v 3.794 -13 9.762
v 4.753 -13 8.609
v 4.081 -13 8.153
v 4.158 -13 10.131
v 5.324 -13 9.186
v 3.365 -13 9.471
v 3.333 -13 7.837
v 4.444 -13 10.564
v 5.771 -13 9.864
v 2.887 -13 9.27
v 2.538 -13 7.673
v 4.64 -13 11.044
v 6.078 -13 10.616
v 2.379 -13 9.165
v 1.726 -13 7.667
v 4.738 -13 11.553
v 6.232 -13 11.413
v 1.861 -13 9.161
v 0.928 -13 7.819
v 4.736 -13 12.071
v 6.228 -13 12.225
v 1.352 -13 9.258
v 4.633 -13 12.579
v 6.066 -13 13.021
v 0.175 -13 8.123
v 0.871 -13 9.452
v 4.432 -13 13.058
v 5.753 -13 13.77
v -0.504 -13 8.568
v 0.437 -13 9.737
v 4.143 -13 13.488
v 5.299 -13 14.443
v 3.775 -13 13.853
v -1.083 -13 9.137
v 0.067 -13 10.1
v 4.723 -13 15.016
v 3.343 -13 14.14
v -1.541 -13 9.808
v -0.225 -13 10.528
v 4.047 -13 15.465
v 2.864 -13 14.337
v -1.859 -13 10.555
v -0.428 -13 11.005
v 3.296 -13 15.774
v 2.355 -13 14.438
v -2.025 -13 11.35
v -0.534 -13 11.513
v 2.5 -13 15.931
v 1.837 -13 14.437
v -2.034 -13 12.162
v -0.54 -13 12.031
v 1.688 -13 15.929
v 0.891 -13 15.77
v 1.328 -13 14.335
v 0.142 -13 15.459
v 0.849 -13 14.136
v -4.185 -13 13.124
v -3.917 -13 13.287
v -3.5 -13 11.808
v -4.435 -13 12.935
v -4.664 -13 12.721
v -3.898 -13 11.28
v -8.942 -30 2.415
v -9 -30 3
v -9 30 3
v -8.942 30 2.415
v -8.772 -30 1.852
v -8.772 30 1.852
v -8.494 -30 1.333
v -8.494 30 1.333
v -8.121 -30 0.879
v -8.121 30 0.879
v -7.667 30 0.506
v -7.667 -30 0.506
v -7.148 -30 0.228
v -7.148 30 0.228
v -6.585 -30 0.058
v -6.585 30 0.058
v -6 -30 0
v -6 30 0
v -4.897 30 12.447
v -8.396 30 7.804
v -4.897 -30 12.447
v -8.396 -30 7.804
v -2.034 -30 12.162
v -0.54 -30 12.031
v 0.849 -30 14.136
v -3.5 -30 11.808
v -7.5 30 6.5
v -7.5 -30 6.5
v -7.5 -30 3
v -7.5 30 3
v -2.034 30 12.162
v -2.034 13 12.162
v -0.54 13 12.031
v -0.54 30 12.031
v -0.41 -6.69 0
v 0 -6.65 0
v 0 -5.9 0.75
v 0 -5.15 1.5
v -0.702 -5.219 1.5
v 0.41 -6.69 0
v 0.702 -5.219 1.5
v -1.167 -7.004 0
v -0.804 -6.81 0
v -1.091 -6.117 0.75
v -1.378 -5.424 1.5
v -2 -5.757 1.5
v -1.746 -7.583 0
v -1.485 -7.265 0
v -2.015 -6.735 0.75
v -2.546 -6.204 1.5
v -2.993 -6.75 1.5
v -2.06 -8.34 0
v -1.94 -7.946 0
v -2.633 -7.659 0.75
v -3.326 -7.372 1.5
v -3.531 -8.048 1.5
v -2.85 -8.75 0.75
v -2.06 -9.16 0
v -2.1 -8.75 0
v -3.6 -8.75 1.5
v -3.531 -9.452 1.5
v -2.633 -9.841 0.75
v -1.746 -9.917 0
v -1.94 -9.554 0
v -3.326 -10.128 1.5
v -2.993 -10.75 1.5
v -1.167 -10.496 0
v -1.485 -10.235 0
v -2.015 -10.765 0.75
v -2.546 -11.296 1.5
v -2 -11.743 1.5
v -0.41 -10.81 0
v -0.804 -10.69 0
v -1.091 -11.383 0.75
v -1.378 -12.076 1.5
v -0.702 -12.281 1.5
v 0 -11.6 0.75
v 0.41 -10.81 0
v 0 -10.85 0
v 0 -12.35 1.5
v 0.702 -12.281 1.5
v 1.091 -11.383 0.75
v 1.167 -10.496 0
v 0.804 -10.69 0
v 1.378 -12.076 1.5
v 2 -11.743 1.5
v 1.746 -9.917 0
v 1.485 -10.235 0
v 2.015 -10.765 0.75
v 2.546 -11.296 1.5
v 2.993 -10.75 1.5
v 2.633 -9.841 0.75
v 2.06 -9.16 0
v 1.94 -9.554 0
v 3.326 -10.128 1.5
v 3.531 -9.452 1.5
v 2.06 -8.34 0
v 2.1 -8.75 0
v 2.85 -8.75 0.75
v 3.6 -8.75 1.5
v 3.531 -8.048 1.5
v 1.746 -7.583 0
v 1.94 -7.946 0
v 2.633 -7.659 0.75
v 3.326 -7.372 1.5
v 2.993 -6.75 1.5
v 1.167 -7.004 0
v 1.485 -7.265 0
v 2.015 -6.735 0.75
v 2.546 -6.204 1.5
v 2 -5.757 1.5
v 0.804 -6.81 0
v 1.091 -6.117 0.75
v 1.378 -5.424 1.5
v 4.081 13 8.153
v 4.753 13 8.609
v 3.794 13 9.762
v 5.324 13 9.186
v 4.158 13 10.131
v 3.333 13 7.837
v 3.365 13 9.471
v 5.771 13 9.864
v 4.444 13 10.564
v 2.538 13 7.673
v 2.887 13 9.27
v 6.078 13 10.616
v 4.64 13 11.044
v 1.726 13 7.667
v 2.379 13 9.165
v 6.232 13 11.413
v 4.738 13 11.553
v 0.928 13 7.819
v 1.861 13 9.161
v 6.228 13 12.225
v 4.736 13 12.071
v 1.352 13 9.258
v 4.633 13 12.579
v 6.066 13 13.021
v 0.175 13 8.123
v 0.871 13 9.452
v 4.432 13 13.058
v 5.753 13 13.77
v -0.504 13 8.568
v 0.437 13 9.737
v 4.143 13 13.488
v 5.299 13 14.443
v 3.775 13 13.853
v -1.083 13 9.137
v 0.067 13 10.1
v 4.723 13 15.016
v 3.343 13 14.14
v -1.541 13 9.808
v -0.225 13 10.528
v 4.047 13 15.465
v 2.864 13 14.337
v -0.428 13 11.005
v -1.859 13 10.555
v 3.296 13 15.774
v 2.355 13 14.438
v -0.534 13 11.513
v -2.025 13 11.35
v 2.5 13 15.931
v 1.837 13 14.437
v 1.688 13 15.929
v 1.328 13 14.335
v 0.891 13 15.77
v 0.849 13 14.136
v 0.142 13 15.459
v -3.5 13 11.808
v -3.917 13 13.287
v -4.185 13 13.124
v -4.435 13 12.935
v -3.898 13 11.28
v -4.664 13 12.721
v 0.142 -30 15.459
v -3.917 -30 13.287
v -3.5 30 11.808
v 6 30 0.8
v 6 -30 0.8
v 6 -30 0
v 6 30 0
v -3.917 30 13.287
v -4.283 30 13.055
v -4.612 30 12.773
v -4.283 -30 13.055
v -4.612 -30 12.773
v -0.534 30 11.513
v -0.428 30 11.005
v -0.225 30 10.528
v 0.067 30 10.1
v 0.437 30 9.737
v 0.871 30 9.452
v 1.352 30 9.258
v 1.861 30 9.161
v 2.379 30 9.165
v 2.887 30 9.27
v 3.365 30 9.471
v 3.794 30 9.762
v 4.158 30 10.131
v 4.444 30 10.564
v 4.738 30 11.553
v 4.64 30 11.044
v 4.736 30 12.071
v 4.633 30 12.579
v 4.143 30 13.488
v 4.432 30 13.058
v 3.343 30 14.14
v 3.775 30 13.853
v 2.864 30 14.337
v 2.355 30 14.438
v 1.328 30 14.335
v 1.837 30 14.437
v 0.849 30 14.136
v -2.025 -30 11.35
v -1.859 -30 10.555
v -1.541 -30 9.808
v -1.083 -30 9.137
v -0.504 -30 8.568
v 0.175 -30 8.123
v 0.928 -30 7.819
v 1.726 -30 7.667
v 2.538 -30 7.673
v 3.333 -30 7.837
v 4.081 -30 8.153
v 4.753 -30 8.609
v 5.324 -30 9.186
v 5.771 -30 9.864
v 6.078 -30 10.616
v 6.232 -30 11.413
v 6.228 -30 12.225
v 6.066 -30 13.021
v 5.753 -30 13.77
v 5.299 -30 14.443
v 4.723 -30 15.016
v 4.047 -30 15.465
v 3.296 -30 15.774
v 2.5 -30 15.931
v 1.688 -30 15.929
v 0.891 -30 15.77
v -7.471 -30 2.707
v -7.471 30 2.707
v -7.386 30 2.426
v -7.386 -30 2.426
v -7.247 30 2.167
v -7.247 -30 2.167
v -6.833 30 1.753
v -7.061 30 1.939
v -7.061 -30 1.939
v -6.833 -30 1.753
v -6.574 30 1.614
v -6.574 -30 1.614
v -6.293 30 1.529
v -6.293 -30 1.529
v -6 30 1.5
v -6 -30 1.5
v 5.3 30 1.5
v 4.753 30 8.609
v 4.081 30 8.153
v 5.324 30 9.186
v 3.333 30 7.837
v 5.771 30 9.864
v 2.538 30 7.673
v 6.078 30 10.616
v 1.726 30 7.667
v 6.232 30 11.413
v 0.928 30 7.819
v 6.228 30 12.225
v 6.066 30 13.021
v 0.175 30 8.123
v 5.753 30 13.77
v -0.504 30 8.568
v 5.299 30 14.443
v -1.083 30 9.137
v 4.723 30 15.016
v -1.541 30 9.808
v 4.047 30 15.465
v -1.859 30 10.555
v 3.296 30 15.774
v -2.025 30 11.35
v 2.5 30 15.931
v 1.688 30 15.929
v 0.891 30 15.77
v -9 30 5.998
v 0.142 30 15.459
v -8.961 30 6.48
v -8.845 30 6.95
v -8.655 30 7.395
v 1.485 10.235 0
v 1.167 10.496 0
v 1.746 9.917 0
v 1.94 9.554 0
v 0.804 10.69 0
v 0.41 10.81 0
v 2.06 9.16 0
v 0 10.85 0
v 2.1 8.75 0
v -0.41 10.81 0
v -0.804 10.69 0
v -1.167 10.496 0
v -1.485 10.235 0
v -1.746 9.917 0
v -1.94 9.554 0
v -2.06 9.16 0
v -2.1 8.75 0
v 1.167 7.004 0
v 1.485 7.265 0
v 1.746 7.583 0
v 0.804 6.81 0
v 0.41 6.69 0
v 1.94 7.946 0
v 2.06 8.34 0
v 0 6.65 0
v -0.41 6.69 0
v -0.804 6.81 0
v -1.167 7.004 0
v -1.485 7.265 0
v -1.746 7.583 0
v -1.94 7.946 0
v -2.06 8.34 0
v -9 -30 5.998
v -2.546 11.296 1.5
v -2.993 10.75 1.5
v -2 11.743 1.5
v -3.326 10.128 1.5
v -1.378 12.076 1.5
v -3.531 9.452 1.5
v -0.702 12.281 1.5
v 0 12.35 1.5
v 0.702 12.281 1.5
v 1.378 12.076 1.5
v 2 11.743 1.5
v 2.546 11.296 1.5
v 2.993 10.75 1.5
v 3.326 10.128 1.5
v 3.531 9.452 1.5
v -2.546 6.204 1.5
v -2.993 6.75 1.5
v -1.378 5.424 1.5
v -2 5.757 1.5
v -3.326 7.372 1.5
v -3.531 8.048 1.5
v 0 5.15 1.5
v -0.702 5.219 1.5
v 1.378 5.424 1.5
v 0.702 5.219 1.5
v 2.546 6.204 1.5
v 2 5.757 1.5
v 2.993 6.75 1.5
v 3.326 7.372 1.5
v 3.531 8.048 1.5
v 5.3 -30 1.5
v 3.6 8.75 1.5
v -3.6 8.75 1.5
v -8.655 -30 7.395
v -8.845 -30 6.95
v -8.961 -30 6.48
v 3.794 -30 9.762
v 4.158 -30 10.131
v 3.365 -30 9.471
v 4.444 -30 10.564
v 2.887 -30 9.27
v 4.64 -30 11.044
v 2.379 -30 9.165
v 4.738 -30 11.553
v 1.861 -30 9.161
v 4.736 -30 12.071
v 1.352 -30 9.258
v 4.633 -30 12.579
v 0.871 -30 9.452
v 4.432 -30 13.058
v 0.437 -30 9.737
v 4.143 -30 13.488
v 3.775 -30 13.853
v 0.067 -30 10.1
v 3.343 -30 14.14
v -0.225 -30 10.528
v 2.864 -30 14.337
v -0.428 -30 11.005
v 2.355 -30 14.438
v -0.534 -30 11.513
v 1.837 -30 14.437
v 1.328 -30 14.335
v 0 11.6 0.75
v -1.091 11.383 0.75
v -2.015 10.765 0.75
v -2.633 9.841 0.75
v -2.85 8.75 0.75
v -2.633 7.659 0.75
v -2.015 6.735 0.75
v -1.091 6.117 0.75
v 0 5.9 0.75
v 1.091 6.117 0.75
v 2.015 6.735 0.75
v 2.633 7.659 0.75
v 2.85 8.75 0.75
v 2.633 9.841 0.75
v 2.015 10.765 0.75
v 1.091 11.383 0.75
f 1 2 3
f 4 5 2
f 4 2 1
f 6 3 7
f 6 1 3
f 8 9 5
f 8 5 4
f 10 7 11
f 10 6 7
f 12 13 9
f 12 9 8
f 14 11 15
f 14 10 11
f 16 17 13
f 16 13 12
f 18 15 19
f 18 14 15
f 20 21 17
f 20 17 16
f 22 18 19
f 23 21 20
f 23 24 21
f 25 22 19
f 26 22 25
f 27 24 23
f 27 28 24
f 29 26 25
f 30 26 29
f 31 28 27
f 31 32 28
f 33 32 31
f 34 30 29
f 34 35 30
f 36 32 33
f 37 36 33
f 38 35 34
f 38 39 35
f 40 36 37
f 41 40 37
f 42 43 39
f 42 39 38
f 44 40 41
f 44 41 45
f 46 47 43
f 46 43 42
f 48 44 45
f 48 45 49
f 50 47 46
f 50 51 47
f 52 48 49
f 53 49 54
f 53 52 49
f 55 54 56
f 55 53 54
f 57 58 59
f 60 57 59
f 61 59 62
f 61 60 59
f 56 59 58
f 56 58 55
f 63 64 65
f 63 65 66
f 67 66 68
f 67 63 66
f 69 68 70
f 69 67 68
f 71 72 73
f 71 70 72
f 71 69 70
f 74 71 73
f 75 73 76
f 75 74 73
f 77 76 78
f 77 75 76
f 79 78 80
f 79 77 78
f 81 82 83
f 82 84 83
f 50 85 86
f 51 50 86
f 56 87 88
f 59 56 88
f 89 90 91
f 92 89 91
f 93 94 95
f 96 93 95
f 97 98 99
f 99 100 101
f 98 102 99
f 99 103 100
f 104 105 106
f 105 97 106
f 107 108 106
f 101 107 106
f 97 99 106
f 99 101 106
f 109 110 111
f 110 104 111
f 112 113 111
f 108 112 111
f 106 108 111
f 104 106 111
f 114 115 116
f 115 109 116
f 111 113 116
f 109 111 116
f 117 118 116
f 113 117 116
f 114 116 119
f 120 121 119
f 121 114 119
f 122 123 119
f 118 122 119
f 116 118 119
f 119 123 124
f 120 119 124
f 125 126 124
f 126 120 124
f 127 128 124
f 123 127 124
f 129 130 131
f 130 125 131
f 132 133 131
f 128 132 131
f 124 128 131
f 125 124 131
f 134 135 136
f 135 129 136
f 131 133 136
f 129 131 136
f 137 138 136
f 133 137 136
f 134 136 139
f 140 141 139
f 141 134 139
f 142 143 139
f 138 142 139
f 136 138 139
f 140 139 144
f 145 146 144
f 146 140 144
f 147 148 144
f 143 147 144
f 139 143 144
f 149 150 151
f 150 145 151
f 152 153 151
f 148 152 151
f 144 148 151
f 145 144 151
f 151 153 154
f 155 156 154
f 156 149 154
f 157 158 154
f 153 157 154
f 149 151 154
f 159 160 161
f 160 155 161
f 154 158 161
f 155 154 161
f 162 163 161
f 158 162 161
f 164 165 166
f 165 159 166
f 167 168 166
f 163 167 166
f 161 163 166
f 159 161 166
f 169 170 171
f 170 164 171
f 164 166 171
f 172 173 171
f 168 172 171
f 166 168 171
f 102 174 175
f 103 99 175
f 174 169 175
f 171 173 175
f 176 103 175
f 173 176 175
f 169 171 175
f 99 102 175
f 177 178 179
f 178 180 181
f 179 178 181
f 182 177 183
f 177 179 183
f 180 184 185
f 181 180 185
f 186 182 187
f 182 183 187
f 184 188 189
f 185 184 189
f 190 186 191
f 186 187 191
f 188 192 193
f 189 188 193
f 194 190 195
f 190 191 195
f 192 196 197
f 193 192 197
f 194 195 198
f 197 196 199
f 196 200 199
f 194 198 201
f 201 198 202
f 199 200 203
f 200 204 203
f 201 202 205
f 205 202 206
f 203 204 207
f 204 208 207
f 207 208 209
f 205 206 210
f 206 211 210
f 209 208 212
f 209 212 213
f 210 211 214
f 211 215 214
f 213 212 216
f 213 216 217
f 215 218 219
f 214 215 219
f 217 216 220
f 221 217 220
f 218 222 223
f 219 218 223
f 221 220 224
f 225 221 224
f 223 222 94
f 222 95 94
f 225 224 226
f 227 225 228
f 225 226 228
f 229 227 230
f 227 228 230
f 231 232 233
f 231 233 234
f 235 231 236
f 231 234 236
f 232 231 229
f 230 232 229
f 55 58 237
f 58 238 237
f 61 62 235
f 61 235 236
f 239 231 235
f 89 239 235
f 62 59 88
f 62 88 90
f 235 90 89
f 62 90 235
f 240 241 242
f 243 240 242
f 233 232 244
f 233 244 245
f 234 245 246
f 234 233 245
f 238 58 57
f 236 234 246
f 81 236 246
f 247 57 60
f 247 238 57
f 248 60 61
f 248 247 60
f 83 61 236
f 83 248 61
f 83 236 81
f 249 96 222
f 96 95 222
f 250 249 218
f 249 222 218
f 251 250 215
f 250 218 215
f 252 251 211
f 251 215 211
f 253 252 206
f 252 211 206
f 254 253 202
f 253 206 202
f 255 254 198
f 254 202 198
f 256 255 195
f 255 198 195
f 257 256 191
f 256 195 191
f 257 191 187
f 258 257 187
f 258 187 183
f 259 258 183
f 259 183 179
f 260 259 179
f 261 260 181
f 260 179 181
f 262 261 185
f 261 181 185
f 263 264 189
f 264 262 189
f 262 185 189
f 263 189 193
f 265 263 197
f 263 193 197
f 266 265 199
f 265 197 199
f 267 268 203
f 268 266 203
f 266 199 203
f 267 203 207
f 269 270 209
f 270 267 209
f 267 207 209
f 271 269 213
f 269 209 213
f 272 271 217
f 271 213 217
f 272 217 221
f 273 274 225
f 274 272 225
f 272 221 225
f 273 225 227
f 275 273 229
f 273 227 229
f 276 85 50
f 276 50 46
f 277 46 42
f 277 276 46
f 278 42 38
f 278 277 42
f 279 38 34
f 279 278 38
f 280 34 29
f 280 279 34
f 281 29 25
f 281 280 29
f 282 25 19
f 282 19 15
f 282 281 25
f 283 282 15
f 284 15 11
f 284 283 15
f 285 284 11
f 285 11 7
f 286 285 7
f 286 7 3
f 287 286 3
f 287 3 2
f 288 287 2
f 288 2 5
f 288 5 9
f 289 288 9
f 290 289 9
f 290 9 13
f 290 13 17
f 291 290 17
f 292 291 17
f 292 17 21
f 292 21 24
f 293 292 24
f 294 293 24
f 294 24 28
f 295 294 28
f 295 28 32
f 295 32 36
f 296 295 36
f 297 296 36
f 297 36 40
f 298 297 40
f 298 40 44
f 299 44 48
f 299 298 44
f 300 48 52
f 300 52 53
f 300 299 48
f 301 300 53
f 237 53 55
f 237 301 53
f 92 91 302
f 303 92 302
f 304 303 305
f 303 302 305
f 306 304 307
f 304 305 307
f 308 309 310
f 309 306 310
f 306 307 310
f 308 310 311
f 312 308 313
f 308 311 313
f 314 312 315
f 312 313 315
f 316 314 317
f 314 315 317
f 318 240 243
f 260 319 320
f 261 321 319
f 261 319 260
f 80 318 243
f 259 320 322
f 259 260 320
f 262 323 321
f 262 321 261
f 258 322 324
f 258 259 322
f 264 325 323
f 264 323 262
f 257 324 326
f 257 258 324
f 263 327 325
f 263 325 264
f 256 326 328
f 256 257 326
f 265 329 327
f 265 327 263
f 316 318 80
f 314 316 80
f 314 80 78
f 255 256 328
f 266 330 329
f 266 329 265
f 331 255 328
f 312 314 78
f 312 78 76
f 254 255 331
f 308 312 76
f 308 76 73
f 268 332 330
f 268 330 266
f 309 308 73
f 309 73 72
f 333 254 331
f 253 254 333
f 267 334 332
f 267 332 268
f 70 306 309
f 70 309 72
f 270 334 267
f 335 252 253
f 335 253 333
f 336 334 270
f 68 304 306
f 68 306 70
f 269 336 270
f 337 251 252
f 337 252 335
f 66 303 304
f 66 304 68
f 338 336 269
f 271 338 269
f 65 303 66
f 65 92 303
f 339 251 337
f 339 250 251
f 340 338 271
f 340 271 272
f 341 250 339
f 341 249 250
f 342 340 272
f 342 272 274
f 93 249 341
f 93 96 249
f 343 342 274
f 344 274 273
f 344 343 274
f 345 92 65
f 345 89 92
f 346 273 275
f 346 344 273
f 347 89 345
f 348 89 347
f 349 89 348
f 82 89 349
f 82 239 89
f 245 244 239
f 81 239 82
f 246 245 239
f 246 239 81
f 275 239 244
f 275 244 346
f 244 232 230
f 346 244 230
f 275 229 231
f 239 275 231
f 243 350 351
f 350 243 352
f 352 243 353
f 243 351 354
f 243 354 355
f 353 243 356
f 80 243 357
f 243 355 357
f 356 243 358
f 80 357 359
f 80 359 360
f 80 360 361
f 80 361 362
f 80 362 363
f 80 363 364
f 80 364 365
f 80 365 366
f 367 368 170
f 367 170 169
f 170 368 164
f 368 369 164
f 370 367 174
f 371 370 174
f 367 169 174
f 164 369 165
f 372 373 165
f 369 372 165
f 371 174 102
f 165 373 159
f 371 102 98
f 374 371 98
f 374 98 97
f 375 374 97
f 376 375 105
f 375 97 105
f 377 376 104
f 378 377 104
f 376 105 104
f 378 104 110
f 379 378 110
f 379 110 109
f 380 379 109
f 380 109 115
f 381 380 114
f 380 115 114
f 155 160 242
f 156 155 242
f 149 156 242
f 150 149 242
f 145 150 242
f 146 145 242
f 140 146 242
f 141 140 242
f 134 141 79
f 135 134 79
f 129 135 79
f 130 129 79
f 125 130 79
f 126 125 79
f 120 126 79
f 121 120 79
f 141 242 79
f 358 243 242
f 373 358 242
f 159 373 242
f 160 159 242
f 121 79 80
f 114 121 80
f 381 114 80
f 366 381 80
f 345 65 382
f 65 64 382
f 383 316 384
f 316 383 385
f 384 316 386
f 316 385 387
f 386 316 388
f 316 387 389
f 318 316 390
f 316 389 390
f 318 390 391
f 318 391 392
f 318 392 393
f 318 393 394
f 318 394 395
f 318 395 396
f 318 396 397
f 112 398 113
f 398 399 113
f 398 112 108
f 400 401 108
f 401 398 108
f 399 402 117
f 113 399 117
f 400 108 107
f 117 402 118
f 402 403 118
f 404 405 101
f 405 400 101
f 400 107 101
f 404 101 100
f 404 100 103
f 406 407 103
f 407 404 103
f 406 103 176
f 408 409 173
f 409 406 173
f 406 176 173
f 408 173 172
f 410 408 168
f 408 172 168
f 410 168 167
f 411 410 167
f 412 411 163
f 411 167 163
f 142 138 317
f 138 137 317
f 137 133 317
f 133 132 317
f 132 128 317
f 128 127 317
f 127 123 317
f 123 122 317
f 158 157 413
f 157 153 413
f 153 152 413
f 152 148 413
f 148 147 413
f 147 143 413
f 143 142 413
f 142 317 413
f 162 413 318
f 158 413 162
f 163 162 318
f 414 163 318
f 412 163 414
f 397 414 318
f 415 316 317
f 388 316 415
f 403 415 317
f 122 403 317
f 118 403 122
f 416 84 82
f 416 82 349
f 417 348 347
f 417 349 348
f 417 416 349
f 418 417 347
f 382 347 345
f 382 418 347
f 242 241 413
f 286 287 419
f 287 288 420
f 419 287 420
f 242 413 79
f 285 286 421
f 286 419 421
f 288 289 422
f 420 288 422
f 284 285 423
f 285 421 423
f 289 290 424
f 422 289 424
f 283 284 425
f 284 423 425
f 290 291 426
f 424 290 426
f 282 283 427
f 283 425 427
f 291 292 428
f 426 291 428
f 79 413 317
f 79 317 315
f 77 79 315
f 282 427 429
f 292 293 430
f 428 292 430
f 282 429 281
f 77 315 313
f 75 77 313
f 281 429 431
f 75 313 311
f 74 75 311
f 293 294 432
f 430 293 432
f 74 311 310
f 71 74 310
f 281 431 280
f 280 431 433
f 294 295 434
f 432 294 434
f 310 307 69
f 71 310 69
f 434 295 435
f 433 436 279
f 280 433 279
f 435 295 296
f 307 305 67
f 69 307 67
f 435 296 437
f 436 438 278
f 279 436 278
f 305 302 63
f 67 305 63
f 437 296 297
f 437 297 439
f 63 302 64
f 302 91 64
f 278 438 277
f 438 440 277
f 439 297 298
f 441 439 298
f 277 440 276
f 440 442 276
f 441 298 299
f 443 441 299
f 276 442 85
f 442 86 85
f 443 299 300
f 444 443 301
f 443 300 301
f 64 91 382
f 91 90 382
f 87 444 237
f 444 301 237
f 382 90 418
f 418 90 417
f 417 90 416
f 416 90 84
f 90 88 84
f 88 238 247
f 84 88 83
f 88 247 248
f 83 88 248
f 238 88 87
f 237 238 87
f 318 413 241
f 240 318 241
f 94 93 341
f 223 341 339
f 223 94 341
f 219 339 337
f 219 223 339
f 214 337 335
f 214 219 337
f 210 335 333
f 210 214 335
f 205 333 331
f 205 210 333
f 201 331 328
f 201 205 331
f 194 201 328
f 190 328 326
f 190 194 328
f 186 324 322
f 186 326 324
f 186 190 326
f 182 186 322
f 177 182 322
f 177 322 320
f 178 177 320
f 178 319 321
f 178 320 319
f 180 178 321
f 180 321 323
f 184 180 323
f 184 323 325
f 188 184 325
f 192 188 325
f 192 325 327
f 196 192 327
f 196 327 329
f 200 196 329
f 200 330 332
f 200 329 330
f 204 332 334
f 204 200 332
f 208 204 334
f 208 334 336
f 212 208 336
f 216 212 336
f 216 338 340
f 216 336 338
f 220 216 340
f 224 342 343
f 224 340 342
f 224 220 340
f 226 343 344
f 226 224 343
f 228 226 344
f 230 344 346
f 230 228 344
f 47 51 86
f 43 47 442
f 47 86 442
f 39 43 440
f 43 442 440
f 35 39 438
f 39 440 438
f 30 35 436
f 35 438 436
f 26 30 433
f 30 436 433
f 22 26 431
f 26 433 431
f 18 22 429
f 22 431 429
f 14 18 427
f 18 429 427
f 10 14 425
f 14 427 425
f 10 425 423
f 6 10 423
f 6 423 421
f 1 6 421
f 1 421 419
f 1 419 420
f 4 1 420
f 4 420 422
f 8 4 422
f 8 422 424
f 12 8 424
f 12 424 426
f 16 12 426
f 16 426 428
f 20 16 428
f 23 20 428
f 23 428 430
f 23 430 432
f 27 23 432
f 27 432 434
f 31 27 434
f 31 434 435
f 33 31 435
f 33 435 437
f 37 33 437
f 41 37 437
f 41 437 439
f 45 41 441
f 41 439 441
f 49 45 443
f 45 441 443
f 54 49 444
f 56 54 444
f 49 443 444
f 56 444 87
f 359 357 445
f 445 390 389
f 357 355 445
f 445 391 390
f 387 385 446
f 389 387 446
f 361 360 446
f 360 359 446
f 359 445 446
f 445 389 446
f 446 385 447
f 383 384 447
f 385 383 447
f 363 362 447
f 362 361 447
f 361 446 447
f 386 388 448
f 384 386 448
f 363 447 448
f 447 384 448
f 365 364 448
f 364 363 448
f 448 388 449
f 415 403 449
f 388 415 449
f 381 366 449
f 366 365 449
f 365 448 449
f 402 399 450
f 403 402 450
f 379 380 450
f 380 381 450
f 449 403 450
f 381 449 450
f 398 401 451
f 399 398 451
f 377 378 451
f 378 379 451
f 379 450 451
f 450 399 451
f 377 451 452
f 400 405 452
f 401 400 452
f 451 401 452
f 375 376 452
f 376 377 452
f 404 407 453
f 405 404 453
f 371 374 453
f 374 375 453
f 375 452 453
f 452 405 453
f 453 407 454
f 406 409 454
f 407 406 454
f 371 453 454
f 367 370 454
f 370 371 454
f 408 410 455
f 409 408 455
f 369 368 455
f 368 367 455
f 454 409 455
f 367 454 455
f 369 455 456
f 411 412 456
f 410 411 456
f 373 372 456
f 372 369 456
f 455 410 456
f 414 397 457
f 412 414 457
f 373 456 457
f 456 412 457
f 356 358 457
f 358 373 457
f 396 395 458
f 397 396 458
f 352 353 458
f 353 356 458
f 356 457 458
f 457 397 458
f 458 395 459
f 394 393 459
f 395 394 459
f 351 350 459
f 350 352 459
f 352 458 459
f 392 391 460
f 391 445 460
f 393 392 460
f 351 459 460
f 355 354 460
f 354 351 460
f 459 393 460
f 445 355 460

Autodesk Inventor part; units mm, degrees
sketch "Skizze_1" plane through (0, 0, 0) normal (0, 1, 0) x (-1, 0, 0)
  arc A0 (9, 5.9981) -> (8.3959, 7.8036) centre (6, 5.9981) ccw
  line L0 (8.3959, 7.8036) -> (4.8967, 12.4471)
  arc A1 (4.8967, 12.4471) -> (3.9166, 13.2866) centre (2.5008, 10.6417) ccw
  line L1 (3.9166, 13.2866) -> (-0.1415, 15.4588)
  arc A2 (-0.1415, 15.4588) -> (2.0342, 12.1617) centre (-2.1, 11.8) ccw
  line L2 (2.0342, 12.1617) -> (0.5399, 12.031)
  arc A3 (-0.8494, 14.1363) -> (0.5399, 12.031) centre (-2.1, 11.8) ccw
  line L3 (-0.8494, 14.1363) -> (3.5, 11.8082)
  line L4 (3.5, 11.8082) -> (7.5, 6.5)
  line L5 (7.5, 6.5) -> (7.5, 3)
  arc A4 (6, 1.5) -> (7.5, 3) centre (6, 3) ccw
  line L6 (6, 1.5) -> (-5.3, 1.5)
  line L7 (-5.3, 1.5) -> (-6, 0.8)
  line L8 (-6, 0.8) -> (-6, 0)
  line L9 (-6, 0) -> (6, 0)
  arc A5 (6, 0) -> (9, 3) centre (6, 3) ccw
  line L10 (9, 3) -> (9, 5.9981)
extrude "Extrusion1" add sketch "Skizze_1" along normal mid plane 60
sketch "Skizze_2" plane through (0, 0, 0) normal (1, 0, 0) x (0, 1, 0)
  line L0 (8.75, 0) -> (8.75, 1.5)
  line L1 (8.75, 1.5) -> (12.35, 1.5)
  line L2 (12.35, 1.5) -> (10.85, 0)
  line L3 (10.85, 0) -> (8.75, 0)
  line L4 (8.75, 0) -> (8.75, 1.5)
revolve "Revolution1" cut sketch "Skizze_2" angle 360 about axis through (0, 8.75, 0) along (0, 0, -1)
sketch "Skizze_3" plane through (0, 0, 0) normal (1, 0, 0) x (0, 1, 0)
  line L0 (-8.75, 0) -> (-8.75, 1.5)
  line L1 (-8.75, 1.5) -> (-5.15, 1.5)
  line L2 (-5.15, 1.5) -> (-6.65, 0)
  line L3 (-6.65, 0) -> (-8.75, 0)
  line L4 (-8.75, 0) -> (-8.75, 1.5)
revolve "Revolution2" cut sketch "Skizze_3" angle 360 about axis through (0, -8.75, 0) along (0, 0, -1)
sketch "Skizze_5" plane through (0, 0, 0) normal (0, 1, 0) x (-1, 0, 0)
  line L0 (19.1684, 40) -> (-42.1, 40)
  line L1 (-42.1, 40) -> (-42.1, 3)
  line L2 (-42.1, 3) -> (-0.5049, 3)
  line L3 (-0.5049, 3) -> (19.1684, 40)
extrude "Extrusion2" cut sketch "Skizze_5" along normal mid plane 26
ref_plane "scharnier_XY" through (0, -8.75, 0) normal (0, 0, 1) x (1, 0, 0)
ref_plane "scharnier_YZ" through (0, -8.75, 0) normal (1, 0, 0) x (0, 1, 0)
ref_plane "scharnier_ZX" through (0, -8.75, 0) normal (0, 1, 0) x (0, 0, 1)
ref_plane "scharnier_2_XY" through (0, 8.75, 0) normal (0, 0, 1) x (1, 0, 0)
ref_plane "scharnier_2_YZ" through (0, 8.75, 0) normal (1, 0, 0) x (0, 1, 0)
ref_plane "scharnier_2_ZX" through (0, 8.75, 0) normal (0, 1, 0) x (0, 0, 1)
ref_plane "tuer_XY" through (2.1, 0, 11.8) normal (0, 1, 0) x (1, 0, 0)
ref_plane "tuer_YZ" through (2.1, 0, 11.8) normal (1, 0, 0) x (0, 0, -1)
ref_plane "tuer_ZX" through (2.1, 0, 11.8) normal (0, 0, -1) x (0, 1, 0)
properties part number "1XXX_01_04"
